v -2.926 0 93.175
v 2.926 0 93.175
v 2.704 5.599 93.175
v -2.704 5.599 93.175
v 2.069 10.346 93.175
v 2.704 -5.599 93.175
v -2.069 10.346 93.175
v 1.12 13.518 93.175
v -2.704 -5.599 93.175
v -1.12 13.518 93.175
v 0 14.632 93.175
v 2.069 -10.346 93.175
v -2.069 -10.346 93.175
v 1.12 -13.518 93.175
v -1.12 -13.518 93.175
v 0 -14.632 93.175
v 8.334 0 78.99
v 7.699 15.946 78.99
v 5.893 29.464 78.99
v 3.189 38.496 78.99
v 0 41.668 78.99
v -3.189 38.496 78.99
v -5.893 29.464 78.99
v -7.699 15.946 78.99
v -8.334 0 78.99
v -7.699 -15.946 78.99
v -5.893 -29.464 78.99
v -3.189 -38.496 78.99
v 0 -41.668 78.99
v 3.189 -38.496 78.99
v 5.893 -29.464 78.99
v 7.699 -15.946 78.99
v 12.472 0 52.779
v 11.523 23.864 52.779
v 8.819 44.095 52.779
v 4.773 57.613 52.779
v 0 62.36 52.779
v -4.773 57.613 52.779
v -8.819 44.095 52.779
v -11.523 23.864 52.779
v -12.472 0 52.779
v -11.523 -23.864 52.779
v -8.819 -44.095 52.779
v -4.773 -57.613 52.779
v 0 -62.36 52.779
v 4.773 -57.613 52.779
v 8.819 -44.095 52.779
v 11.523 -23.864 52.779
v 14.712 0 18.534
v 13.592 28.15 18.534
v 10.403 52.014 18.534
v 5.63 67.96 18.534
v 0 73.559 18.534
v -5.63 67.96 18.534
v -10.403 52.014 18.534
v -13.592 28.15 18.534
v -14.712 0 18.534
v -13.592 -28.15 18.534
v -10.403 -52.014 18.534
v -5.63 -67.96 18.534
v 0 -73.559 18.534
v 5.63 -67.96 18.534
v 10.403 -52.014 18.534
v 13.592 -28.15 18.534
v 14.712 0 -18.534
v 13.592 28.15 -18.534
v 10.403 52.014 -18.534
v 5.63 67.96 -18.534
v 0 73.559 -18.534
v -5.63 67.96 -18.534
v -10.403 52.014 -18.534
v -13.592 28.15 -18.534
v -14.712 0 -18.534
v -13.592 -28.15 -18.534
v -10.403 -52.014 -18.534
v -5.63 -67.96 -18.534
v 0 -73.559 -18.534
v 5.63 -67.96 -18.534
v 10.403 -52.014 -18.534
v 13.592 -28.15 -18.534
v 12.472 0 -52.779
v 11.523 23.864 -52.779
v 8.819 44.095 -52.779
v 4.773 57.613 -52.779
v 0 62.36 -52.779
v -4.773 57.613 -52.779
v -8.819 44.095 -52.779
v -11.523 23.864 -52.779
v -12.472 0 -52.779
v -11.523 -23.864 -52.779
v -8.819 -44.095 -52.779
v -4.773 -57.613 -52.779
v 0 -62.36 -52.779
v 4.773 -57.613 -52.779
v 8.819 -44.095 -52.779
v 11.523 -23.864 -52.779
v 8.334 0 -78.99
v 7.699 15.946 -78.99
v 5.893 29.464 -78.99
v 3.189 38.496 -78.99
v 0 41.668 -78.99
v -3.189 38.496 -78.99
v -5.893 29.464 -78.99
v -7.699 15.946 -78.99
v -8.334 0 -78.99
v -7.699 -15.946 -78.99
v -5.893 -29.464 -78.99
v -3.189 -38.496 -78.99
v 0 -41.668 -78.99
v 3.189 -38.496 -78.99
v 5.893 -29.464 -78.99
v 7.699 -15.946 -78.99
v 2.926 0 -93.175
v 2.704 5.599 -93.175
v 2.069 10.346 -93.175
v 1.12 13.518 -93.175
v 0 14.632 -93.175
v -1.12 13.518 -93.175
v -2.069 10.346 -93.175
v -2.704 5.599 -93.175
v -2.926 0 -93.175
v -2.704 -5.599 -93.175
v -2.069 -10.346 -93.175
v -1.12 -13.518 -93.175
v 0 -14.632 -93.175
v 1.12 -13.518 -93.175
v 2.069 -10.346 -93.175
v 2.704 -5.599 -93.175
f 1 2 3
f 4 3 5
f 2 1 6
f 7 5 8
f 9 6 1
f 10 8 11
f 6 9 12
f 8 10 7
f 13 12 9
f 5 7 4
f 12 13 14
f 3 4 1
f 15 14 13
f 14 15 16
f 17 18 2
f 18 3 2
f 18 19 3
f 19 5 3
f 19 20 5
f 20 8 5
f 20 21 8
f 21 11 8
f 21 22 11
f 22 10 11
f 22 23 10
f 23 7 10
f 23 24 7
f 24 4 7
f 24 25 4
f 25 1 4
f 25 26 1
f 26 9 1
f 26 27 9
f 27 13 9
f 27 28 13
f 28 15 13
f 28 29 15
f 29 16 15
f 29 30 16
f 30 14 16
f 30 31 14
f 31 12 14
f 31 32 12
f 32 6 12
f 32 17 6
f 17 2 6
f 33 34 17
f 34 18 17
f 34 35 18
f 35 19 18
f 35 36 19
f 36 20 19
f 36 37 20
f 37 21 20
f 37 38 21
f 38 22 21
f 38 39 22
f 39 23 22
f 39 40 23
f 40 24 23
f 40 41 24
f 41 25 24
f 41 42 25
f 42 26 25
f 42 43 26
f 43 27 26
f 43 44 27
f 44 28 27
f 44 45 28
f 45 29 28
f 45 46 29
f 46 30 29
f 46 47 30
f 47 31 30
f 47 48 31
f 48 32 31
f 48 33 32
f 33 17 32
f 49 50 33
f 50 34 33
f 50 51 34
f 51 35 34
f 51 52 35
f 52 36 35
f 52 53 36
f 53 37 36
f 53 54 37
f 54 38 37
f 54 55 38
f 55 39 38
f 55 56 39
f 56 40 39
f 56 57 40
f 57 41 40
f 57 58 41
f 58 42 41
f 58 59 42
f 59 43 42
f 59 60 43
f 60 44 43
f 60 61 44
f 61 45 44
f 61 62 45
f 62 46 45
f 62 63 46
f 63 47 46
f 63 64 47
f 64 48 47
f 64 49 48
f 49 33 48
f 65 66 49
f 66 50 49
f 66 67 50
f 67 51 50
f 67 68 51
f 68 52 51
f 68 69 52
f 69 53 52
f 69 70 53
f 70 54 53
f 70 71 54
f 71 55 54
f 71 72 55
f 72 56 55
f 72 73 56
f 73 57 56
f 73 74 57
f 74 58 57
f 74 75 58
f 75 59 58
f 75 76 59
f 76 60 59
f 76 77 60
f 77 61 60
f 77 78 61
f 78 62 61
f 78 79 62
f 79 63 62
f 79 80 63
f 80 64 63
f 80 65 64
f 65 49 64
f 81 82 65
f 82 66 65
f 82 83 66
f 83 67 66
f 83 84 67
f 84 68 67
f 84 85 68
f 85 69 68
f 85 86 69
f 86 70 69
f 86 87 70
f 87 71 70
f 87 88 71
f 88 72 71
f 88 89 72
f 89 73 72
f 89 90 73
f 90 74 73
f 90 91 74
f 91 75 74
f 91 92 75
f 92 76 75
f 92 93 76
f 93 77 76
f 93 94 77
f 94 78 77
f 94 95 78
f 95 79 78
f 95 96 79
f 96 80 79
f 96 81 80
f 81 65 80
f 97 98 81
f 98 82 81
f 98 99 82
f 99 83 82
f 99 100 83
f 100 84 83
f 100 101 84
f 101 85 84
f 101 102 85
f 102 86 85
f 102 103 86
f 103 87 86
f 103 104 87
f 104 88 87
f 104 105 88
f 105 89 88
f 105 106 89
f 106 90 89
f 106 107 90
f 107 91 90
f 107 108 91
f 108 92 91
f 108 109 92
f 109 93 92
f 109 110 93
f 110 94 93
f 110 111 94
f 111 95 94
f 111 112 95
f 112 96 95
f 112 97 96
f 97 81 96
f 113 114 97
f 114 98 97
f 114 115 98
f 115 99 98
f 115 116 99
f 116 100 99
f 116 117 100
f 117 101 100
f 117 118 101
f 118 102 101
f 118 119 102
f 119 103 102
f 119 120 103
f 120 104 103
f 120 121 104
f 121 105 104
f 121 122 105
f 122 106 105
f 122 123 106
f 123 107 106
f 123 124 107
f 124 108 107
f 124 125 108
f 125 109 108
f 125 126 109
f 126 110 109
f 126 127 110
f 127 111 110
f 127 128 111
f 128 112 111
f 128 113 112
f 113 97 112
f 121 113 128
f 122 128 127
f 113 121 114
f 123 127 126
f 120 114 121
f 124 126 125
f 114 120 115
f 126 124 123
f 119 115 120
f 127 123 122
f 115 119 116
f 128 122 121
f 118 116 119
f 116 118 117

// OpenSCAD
// Generated by SolidPython 1.0.1 on 2020-07-29 00:46:45


scale(v = [3, 15, 19]) {
	sphere(r = 5);
}
/***********************************************
*********      SolidPython code:      **********
************************************************
 
# import packages: SolidPython
from solid import *
from solid.utils import *
from itertools import chain, combinations, permutations


class Resize:

    def __init__(self, scad_file):
        self.scad_file = scad_file
        #self.scad_file = import_scad(scad_file)
        # cone/cylinder param:
        self.r1 = 0
        self.r2 = 0
        self.h = 0
        # rectangular prism param:
        self.w = 0
        self.l = 0
        # ellipse param:
        self.r = 0

    # import OpenScad code (file name corresponds to shape)


    # classify shape + parameters
    def assign(self, param1, param2, param3):
        if self.scad_file == 'cone.scad':
            self.r1 = param1
            self.r2 = param2
            self.h = param3
        elif self.scad_file == 'cylinder.scad':
            self.r1 = param1
            self.r2 = param2
            self.h = param3
        elif self.scad_file == 'rectangularPrism.scad':
            self.h = param1
            self.l = param2
            self.w = param3
        else:
            self.r = param1
            self.h = param2

    # resize parameters
    def iterate(self):
        x = range(3, 20, 2)
        i = 1
        if self.scad_file == 'cone.scad':
            tempList = list(permutations(x, 2))
            for temp in tempList:
                param1 = temp[0]
                param2 = temp[1]
                filepath = 'produced_scad_files/' + 'cone' + str(param1) + '_' + str(param2) + '_' + '.scad'
                scad_render_to_file(cylinder(h=param1, r1=param2, r2=0), filepath)

        elif self.scad_file == 'cylinder.scad':
            tempList = list(permutations(x, 3))
            for temp in tempList:
                param1 = temp[0]
                param2 = temp[1]
                filepath = 'produced_scad_files/' + 'cylinder' + str(param1) + '_' + str(param2) + '_' + '.scad'
                scad_render_to_file(cylinder(h=param1, r1=param2, r2=param2), filepath)

        elif self.scad_file == 'rectangularPrism.scad':
            tempList = list(permutations(x, 3))
            for temp in tempList:
                param1 = temp[0]
                param2 = temp[1]
                param3 = temp[2]
                filepath = 'produced_scad_files/' + 'rectangularPrism' + str(param1) + '_' + str(param2) + '_' + str(
                    param3) + '.scad'
                scad_render_to_file(cube(size=(param1, param2, param3)), filepath)

        elif self.scad_file == 'ellipse.scad':
            tempList = list(permutations(x, 4))
            for temp in tempList:
                param1 = temp[0]
                param2 = temp[1]
                param3 = temp[2]
                param4 = temp[3]
                filepath = 'produced_scad_files/' + 'ellipse' + str(param1) + '_' + str(param2) + '_' + str(param3) + '_' + str(param4) + '.scad'
                scad_render_to_file(scale([param1, param2, param3])(sphere(r=param4)), filepath)

    def render_to_scadfile(self):
        scad_render_to_file(scad, 'example.scad') 
 
************************************************/
